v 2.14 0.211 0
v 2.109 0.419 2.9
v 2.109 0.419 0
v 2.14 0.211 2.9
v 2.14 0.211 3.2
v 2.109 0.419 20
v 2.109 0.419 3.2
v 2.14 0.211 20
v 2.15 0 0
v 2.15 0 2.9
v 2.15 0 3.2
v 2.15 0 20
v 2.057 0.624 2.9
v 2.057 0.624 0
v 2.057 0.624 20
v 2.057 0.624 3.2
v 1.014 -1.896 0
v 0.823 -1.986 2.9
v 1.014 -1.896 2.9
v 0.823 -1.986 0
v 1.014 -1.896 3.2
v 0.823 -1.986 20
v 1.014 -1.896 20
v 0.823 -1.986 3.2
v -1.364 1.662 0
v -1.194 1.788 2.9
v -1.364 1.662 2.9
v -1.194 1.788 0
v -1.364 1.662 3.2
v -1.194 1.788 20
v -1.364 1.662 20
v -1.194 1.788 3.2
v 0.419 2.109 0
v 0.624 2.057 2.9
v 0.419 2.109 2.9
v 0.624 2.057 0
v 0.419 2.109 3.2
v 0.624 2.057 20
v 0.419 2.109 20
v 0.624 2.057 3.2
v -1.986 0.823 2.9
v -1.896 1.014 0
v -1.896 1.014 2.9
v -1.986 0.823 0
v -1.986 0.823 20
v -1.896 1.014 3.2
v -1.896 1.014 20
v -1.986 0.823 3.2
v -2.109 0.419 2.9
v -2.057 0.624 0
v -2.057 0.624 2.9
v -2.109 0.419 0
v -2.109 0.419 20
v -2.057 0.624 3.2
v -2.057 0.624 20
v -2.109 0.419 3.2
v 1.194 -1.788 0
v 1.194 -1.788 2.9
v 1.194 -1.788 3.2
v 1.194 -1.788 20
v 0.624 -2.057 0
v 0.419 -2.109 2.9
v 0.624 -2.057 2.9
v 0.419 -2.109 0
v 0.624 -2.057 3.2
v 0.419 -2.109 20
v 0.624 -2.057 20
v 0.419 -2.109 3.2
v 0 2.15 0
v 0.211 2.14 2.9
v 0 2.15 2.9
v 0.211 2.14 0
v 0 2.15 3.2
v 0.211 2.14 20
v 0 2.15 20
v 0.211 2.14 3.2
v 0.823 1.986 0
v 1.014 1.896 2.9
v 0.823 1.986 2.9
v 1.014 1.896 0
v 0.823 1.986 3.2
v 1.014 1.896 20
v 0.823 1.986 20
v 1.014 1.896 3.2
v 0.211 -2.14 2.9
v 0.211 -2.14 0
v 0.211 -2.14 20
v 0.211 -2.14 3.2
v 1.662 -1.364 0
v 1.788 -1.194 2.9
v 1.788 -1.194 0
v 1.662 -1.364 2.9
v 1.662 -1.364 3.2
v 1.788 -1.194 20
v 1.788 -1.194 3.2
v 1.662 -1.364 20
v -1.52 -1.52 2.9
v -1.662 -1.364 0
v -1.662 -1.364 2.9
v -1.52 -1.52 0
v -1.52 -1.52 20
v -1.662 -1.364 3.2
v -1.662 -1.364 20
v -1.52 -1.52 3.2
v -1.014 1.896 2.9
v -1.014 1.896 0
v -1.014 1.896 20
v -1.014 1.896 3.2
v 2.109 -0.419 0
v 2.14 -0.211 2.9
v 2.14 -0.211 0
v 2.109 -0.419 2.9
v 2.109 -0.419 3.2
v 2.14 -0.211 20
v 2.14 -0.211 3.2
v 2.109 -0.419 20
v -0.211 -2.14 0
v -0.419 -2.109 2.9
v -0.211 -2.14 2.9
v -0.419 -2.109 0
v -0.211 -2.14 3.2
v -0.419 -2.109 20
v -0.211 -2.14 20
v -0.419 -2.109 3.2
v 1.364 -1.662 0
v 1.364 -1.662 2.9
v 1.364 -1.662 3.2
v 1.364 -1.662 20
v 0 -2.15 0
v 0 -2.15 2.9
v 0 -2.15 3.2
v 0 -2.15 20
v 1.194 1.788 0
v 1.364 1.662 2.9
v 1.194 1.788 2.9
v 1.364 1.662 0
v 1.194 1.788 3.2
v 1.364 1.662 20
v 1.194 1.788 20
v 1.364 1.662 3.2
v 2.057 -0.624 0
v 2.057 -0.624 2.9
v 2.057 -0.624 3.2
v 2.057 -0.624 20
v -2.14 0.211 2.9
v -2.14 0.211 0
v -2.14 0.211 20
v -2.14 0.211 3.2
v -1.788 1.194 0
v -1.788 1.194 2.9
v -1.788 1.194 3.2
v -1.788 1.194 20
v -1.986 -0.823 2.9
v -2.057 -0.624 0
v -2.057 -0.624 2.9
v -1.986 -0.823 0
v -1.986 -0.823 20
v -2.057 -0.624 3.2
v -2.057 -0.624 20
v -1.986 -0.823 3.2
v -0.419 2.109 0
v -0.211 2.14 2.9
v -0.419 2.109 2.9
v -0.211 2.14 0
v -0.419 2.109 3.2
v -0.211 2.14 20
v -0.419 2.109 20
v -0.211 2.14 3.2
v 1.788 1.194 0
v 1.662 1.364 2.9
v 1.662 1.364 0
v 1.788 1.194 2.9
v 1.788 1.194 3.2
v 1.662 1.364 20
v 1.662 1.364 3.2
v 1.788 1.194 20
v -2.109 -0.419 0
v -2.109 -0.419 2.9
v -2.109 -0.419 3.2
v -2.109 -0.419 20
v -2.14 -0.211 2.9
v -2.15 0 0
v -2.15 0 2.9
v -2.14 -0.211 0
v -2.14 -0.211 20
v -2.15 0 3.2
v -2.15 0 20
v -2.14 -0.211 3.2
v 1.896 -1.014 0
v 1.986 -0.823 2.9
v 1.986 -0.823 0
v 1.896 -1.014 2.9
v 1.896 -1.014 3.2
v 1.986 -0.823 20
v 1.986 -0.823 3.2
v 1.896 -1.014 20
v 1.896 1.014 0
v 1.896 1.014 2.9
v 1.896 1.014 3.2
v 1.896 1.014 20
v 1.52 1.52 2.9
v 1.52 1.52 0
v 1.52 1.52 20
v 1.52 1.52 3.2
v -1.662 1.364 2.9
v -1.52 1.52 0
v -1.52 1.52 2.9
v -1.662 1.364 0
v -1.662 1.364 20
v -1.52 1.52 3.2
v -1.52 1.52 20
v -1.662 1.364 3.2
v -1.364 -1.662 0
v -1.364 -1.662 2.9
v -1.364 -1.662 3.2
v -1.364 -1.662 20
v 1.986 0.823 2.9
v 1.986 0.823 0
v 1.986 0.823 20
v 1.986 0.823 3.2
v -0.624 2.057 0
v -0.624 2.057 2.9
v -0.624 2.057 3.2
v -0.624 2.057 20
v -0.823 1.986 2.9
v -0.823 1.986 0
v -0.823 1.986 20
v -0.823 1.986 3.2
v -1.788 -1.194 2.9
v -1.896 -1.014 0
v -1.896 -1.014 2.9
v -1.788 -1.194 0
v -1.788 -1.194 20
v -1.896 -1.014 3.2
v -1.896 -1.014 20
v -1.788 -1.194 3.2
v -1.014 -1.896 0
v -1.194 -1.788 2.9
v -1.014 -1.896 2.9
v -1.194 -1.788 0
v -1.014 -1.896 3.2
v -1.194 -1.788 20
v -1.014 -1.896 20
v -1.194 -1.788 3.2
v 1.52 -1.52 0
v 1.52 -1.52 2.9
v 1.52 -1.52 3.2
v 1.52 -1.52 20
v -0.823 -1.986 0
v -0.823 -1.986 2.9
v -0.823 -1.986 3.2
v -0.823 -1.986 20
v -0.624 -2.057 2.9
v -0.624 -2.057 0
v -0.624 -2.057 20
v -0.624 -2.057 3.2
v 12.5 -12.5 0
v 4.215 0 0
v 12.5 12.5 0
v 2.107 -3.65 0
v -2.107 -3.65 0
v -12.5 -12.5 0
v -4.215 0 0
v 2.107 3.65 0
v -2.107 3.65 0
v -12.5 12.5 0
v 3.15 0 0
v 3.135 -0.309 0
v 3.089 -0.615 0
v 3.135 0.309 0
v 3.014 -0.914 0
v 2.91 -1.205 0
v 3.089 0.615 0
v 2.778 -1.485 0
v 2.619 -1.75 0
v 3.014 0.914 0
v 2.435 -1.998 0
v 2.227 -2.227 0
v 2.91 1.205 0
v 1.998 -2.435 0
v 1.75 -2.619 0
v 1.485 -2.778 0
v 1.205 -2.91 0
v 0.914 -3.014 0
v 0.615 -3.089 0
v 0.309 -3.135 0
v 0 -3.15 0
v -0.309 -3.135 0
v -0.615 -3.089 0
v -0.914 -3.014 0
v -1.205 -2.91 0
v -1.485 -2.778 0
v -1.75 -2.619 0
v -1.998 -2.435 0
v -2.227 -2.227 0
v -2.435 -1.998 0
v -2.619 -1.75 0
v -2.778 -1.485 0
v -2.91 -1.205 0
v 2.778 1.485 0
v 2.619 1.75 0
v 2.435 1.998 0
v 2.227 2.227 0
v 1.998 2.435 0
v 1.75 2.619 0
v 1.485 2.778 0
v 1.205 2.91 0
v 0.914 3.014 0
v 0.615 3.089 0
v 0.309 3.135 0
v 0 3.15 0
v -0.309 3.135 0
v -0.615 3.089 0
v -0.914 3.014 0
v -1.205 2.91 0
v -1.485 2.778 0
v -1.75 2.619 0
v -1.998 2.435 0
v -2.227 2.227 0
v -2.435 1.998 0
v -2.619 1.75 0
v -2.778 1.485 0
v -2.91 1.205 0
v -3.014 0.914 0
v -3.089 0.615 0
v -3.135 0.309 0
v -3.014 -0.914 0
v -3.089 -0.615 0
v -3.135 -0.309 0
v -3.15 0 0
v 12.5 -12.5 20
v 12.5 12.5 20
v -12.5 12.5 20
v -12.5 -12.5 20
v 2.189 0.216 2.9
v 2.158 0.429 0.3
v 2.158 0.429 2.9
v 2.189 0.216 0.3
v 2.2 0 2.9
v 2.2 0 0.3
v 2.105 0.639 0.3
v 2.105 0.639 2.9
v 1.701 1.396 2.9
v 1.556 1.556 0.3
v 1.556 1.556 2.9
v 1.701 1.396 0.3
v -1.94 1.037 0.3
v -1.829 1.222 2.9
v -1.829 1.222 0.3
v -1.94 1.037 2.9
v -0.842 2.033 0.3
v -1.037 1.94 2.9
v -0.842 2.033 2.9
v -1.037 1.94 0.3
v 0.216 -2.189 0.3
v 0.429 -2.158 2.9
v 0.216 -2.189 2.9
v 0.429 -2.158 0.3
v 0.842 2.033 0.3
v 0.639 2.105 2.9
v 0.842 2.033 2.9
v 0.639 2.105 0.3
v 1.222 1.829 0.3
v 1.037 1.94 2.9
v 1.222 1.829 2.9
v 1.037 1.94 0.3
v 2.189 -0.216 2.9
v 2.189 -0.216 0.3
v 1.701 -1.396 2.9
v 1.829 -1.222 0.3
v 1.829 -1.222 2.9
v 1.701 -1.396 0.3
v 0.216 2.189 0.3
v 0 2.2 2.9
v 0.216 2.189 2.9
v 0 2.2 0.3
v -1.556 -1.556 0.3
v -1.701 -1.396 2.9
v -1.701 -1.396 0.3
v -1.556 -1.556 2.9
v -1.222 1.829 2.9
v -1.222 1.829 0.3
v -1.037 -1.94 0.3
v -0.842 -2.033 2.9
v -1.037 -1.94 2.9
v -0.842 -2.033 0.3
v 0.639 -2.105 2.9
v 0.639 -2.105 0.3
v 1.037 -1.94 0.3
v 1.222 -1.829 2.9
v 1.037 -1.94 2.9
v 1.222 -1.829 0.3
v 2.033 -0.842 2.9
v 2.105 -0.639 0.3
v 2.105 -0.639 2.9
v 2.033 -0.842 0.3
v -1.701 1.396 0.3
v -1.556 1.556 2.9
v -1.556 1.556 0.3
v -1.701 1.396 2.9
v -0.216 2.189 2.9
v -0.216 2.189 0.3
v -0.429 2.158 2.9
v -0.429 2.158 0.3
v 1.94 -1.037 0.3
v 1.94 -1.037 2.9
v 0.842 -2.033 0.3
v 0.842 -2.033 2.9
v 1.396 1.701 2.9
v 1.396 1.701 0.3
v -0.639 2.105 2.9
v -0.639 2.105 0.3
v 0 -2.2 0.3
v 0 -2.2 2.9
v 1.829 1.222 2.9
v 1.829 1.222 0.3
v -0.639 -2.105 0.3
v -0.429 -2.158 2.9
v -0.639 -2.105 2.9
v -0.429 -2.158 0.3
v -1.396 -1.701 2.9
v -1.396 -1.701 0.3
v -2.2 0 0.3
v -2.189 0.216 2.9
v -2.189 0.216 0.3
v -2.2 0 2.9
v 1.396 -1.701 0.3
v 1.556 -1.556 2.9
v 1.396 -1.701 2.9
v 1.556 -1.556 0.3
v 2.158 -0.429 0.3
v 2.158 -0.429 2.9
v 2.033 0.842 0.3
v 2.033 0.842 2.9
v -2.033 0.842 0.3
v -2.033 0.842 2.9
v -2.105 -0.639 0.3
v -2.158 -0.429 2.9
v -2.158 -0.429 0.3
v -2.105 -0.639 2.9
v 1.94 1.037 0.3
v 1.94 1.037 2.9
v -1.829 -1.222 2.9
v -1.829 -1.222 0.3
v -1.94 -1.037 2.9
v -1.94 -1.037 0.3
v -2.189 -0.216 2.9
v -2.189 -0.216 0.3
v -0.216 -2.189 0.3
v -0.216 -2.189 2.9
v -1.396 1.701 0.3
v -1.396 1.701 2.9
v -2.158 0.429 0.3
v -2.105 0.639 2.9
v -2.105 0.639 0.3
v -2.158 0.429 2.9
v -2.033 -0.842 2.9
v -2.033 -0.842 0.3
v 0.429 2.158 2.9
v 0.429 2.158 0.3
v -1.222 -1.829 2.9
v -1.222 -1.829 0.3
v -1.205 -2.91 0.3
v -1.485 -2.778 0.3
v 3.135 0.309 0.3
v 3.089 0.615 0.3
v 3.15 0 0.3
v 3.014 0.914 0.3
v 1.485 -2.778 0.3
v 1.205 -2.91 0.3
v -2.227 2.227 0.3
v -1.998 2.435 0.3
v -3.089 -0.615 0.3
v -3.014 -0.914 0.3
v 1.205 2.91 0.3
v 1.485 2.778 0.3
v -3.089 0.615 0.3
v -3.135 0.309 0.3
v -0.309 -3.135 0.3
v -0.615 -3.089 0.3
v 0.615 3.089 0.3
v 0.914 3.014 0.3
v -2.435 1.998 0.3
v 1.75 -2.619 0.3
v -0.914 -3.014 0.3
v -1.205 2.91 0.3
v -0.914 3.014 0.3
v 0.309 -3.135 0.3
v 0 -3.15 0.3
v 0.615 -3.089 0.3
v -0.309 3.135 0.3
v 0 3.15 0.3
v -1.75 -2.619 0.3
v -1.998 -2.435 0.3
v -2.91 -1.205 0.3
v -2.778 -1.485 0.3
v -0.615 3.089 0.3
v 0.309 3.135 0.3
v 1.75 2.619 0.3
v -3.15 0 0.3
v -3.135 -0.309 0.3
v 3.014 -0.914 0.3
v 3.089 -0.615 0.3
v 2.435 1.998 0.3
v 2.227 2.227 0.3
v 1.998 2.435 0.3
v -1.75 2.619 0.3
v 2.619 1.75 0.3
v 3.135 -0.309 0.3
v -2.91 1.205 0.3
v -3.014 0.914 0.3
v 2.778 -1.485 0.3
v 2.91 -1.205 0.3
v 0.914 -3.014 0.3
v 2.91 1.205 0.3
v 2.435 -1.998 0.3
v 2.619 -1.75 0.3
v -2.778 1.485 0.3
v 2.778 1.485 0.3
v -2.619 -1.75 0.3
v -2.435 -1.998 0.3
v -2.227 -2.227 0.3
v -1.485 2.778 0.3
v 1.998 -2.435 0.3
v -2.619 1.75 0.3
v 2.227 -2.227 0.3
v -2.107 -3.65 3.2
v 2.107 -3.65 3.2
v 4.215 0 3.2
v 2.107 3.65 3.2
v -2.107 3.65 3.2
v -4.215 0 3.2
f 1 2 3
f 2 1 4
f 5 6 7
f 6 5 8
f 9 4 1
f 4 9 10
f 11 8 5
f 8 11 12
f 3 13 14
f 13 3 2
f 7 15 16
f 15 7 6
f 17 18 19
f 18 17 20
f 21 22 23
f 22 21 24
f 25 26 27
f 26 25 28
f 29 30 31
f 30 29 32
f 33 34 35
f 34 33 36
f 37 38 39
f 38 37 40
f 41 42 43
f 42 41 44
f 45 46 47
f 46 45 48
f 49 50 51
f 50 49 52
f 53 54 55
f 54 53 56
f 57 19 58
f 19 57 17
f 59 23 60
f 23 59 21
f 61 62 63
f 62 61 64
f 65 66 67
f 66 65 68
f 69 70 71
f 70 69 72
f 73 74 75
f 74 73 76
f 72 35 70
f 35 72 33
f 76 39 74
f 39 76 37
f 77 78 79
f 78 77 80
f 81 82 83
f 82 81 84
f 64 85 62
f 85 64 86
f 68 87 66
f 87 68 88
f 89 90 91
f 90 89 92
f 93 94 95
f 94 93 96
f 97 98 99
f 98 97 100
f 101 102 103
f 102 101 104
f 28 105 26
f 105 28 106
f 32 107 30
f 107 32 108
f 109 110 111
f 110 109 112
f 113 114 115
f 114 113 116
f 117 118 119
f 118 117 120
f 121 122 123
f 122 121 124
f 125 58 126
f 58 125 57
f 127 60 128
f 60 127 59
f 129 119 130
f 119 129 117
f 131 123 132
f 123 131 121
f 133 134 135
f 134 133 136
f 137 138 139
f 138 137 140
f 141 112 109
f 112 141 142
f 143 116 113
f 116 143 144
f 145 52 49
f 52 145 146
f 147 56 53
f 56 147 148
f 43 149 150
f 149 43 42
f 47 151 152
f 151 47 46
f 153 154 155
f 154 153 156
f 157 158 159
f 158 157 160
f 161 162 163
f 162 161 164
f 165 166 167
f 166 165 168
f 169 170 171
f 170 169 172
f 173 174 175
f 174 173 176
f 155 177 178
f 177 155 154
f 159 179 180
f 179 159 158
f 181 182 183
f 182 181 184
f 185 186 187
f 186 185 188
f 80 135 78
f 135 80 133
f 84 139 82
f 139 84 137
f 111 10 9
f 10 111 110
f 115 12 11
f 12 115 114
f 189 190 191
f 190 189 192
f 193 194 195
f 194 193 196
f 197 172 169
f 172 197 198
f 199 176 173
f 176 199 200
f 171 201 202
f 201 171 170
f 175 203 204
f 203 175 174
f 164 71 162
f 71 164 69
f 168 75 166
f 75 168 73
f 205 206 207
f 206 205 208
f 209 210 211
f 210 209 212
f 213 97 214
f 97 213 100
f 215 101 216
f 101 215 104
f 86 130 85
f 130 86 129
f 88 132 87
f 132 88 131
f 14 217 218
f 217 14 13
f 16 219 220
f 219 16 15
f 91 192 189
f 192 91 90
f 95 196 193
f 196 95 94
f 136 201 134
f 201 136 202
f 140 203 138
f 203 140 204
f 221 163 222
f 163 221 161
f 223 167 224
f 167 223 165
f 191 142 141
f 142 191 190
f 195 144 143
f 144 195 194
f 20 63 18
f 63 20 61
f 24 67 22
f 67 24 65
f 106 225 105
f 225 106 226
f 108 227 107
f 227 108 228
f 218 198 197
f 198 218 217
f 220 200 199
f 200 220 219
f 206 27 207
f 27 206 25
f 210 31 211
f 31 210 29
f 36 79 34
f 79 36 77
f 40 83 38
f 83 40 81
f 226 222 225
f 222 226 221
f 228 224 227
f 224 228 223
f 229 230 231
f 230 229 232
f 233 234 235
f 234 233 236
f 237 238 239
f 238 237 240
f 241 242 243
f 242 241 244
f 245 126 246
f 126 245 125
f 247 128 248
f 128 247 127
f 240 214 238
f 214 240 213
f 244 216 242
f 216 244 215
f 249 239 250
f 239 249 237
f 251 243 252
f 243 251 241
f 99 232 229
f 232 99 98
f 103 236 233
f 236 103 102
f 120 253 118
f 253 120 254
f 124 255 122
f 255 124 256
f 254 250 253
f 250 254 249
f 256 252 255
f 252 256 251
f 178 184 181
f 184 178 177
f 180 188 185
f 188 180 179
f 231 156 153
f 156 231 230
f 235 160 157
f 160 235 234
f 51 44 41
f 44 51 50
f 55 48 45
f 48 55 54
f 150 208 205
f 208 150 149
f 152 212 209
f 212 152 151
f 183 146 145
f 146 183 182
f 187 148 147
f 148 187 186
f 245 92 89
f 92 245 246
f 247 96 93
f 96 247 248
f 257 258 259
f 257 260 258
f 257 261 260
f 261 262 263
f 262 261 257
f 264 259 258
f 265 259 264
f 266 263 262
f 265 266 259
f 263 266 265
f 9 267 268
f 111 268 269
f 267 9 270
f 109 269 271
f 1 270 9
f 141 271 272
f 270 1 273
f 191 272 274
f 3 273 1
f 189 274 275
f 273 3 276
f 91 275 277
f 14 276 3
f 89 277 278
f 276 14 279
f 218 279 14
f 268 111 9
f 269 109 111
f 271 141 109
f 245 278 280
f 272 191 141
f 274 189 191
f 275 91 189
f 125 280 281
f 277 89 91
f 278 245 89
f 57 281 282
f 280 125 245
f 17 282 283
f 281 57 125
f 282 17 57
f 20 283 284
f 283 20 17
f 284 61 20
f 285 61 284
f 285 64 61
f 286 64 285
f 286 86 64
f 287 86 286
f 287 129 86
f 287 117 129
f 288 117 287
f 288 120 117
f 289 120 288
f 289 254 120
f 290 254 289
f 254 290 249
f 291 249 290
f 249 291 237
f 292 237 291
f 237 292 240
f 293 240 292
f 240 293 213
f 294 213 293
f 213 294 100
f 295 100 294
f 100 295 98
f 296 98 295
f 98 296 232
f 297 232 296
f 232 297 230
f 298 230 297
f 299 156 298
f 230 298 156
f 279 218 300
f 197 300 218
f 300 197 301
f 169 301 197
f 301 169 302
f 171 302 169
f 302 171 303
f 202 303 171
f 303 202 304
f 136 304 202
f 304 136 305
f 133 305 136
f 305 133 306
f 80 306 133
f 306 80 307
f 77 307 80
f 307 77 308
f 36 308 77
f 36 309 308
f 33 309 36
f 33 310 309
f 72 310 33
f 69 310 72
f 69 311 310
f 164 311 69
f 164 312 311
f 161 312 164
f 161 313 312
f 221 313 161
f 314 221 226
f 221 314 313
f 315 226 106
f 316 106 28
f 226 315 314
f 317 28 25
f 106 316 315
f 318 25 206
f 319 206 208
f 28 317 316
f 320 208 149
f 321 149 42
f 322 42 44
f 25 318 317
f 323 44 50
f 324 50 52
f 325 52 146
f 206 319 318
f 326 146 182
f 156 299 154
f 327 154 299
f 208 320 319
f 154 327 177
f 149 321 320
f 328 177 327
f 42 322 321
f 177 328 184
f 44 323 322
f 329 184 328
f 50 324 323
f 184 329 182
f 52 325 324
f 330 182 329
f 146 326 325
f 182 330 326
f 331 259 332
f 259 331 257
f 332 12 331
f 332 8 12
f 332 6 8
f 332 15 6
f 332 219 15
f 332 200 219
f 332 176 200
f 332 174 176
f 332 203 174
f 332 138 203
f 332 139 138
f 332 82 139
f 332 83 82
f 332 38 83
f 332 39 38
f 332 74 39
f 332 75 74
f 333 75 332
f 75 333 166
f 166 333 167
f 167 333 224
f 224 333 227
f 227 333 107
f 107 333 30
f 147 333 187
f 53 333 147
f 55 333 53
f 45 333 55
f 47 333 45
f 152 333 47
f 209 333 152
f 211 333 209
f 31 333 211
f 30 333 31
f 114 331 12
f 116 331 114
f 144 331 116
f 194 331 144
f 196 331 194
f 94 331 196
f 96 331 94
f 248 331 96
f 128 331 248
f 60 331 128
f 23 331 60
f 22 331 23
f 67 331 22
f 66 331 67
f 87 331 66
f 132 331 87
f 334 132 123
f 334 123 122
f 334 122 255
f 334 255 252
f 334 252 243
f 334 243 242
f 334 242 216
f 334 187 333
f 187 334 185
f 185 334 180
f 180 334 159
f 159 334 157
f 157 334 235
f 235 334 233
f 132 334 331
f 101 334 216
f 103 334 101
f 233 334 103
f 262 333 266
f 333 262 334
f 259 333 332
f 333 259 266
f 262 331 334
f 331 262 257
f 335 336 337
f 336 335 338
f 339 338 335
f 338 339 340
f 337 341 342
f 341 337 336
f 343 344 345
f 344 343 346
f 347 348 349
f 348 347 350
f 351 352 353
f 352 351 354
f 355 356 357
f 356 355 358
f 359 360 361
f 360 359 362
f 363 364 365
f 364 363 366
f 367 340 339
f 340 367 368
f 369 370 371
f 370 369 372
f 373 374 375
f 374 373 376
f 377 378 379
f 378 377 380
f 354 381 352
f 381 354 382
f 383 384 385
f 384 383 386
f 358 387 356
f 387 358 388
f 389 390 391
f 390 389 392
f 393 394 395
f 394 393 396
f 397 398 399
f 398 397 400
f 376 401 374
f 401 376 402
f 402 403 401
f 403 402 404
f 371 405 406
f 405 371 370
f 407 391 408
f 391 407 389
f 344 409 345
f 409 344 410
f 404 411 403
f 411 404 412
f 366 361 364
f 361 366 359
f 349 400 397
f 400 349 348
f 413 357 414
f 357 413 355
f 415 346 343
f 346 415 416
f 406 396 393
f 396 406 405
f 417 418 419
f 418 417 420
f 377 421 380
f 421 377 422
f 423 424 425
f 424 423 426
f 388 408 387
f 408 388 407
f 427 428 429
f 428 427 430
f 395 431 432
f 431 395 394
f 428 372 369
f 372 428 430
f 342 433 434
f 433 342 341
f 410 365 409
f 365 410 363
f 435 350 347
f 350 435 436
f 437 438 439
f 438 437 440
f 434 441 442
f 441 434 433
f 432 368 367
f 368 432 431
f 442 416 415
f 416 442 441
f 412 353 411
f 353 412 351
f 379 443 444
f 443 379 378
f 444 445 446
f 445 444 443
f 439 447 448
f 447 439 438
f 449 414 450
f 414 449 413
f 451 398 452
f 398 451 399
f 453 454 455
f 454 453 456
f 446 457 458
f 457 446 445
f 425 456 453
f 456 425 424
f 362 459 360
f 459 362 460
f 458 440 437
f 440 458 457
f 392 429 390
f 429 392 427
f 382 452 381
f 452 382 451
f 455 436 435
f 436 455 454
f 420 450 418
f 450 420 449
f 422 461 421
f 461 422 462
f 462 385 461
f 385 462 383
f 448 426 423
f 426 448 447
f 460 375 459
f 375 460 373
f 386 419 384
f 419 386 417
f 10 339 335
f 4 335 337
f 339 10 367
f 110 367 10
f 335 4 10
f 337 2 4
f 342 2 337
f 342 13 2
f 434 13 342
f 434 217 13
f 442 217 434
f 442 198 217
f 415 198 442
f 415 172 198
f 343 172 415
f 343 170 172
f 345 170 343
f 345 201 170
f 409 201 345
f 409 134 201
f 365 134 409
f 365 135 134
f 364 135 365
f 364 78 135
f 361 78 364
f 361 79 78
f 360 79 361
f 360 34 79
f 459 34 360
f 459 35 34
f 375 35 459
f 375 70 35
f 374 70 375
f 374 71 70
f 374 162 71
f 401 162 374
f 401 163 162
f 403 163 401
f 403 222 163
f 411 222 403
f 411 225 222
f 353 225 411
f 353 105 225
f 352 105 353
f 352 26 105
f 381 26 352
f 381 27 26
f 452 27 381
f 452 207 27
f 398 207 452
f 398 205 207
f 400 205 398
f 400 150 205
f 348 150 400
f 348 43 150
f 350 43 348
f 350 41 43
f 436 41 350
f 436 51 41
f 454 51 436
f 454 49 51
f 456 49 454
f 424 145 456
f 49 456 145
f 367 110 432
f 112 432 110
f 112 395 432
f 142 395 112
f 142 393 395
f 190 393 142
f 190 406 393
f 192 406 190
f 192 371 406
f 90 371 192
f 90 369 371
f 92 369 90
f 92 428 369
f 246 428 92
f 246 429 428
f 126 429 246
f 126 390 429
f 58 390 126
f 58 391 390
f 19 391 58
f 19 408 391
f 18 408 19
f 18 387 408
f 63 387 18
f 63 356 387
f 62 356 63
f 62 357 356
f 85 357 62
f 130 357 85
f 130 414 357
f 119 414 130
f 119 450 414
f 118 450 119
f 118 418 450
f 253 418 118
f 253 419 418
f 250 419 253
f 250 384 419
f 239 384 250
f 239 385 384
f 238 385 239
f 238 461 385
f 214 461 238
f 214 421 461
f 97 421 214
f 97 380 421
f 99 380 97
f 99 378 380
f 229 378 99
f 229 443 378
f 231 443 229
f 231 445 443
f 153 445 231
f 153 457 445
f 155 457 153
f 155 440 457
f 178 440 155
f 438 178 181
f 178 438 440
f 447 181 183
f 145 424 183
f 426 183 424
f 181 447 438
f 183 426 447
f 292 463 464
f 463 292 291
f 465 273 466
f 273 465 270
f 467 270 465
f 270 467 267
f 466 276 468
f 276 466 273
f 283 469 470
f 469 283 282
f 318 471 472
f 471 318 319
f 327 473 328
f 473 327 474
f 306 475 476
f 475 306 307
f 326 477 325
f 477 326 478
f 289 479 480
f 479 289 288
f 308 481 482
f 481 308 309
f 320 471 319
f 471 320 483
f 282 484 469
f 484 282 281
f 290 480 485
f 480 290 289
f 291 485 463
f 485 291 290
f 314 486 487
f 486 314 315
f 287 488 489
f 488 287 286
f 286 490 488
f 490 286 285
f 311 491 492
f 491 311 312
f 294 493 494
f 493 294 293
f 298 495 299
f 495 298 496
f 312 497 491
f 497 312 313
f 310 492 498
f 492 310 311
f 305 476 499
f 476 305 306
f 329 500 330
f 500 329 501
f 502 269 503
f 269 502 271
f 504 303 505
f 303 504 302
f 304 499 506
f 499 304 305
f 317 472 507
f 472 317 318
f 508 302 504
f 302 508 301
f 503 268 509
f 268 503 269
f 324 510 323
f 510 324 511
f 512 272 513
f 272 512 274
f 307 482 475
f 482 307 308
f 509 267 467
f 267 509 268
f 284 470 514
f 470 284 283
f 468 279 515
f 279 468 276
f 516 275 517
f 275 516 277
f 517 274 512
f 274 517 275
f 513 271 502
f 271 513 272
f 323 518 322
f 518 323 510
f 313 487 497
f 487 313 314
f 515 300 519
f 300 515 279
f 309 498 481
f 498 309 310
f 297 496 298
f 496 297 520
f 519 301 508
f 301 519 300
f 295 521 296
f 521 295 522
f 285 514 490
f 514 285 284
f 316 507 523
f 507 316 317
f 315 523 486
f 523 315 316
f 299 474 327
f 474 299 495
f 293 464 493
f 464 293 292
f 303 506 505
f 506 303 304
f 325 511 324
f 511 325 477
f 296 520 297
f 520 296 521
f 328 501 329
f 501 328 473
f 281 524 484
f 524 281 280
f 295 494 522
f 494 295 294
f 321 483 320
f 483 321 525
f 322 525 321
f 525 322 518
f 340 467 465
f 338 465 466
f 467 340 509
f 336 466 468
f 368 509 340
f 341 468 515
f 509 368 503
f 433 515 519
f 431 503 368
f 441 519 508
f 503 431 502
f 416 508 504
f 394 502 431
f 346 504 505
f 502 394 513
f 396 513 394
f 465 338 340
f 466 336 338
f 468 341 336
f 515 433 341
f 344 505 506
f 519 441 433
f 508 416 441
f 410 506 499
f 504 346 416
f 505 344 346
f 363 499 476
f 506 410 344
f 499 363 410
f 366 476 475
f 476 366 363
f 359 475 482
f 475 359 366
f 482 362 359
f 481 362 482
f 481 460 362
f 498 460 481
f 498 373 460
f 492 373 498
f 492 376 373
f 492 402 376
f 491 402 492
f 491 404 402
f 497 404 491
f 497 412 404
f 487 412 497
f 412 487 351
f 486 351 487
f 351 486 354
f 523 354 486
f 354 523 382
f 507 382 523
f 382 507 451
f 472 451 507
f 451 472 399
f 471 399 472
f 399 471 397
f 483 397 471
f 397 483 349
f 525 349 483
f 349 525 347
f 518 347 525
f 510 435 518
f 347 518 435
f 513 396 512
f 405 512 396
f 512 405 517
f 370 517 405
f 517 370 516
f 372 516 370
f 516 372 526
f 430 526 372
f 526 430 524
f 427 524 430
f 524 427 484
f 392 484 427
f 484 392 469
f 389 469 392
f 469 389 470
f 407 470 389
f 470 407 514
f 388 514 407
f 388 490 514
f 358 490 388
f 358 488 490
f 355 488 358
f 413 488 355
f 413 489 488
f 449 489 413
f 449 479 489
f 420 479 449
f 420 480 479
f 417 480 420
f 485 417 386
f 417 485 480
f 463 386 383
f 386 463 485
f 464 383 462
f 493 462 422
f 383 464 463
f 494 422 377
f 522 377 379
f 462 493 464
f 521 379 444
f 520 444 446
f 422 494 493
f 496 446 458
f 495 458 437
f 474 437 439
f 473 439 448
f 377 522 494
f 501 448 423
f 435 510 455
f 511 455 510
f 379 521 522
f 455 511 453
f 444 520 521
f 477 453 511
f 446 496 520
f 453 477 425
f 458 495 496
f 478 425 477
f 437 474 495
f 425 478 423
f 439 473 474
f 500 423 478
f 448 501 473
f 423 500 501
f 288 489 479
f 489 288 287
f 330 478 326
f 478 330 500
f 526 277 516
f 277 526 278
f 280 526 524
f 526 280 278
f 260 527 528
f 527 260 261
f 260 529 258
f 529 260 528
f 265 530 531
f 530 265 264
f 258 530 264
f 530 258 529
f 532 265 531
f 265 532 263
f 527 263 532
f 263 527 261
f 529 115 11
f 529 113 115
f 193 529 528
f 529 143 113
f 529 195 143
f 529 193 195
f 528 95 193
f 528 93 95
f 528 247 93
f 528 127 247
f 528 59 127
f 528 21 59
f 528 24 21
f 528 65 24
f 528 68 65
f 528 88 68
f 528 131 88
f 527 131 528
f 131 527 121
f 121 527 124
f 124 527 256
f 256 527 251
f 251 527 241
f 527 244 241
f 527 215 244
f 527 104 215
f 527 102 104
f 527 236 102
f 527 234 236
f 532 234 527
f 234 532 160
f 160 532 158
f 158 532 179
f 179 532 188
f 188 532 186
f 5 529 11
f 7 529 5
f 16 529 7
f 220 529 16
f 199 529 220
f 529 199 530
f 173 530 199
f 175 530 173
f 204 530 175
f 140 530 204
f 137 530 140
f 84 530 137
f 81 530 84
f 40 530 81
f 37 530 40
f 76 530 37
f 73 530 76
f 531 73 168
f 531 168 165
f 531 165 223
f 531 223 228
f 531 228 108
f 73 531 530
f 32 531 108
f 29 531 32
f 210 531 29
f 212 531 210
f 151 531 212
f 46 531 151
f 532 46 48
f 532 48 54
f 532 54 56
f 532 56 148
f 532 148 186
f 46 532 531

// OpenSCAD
$fn=64;
color("BurlyWood"){difference(){difference(){translate(v = [-12.500, -12.500])
cube(size = [25, 25, 20]);
translate(v = [0, 0, 40])
mirror(v = [0, 0, 1])
union(){color("Gainsboro"){translate(v = [0, 0, -4])
cylinder(h = 4, r = 3.500);
}
color("Gainsboro"){cylinder(h = 20, r = 2.150);
}
color("DarkGray"){translate(v = [0, 0, 20])
cylinder(h = 20, r = 2.150);
}
}
}
color("Gainsboro"){difference(){cylinder(h = 3.200, $fn = 6, r = 4.215);
union(){cylinder(h = 2.900, r = 2.200);
cylinder(h = 0.300, r = 3.150);
}
}
}
}
}
